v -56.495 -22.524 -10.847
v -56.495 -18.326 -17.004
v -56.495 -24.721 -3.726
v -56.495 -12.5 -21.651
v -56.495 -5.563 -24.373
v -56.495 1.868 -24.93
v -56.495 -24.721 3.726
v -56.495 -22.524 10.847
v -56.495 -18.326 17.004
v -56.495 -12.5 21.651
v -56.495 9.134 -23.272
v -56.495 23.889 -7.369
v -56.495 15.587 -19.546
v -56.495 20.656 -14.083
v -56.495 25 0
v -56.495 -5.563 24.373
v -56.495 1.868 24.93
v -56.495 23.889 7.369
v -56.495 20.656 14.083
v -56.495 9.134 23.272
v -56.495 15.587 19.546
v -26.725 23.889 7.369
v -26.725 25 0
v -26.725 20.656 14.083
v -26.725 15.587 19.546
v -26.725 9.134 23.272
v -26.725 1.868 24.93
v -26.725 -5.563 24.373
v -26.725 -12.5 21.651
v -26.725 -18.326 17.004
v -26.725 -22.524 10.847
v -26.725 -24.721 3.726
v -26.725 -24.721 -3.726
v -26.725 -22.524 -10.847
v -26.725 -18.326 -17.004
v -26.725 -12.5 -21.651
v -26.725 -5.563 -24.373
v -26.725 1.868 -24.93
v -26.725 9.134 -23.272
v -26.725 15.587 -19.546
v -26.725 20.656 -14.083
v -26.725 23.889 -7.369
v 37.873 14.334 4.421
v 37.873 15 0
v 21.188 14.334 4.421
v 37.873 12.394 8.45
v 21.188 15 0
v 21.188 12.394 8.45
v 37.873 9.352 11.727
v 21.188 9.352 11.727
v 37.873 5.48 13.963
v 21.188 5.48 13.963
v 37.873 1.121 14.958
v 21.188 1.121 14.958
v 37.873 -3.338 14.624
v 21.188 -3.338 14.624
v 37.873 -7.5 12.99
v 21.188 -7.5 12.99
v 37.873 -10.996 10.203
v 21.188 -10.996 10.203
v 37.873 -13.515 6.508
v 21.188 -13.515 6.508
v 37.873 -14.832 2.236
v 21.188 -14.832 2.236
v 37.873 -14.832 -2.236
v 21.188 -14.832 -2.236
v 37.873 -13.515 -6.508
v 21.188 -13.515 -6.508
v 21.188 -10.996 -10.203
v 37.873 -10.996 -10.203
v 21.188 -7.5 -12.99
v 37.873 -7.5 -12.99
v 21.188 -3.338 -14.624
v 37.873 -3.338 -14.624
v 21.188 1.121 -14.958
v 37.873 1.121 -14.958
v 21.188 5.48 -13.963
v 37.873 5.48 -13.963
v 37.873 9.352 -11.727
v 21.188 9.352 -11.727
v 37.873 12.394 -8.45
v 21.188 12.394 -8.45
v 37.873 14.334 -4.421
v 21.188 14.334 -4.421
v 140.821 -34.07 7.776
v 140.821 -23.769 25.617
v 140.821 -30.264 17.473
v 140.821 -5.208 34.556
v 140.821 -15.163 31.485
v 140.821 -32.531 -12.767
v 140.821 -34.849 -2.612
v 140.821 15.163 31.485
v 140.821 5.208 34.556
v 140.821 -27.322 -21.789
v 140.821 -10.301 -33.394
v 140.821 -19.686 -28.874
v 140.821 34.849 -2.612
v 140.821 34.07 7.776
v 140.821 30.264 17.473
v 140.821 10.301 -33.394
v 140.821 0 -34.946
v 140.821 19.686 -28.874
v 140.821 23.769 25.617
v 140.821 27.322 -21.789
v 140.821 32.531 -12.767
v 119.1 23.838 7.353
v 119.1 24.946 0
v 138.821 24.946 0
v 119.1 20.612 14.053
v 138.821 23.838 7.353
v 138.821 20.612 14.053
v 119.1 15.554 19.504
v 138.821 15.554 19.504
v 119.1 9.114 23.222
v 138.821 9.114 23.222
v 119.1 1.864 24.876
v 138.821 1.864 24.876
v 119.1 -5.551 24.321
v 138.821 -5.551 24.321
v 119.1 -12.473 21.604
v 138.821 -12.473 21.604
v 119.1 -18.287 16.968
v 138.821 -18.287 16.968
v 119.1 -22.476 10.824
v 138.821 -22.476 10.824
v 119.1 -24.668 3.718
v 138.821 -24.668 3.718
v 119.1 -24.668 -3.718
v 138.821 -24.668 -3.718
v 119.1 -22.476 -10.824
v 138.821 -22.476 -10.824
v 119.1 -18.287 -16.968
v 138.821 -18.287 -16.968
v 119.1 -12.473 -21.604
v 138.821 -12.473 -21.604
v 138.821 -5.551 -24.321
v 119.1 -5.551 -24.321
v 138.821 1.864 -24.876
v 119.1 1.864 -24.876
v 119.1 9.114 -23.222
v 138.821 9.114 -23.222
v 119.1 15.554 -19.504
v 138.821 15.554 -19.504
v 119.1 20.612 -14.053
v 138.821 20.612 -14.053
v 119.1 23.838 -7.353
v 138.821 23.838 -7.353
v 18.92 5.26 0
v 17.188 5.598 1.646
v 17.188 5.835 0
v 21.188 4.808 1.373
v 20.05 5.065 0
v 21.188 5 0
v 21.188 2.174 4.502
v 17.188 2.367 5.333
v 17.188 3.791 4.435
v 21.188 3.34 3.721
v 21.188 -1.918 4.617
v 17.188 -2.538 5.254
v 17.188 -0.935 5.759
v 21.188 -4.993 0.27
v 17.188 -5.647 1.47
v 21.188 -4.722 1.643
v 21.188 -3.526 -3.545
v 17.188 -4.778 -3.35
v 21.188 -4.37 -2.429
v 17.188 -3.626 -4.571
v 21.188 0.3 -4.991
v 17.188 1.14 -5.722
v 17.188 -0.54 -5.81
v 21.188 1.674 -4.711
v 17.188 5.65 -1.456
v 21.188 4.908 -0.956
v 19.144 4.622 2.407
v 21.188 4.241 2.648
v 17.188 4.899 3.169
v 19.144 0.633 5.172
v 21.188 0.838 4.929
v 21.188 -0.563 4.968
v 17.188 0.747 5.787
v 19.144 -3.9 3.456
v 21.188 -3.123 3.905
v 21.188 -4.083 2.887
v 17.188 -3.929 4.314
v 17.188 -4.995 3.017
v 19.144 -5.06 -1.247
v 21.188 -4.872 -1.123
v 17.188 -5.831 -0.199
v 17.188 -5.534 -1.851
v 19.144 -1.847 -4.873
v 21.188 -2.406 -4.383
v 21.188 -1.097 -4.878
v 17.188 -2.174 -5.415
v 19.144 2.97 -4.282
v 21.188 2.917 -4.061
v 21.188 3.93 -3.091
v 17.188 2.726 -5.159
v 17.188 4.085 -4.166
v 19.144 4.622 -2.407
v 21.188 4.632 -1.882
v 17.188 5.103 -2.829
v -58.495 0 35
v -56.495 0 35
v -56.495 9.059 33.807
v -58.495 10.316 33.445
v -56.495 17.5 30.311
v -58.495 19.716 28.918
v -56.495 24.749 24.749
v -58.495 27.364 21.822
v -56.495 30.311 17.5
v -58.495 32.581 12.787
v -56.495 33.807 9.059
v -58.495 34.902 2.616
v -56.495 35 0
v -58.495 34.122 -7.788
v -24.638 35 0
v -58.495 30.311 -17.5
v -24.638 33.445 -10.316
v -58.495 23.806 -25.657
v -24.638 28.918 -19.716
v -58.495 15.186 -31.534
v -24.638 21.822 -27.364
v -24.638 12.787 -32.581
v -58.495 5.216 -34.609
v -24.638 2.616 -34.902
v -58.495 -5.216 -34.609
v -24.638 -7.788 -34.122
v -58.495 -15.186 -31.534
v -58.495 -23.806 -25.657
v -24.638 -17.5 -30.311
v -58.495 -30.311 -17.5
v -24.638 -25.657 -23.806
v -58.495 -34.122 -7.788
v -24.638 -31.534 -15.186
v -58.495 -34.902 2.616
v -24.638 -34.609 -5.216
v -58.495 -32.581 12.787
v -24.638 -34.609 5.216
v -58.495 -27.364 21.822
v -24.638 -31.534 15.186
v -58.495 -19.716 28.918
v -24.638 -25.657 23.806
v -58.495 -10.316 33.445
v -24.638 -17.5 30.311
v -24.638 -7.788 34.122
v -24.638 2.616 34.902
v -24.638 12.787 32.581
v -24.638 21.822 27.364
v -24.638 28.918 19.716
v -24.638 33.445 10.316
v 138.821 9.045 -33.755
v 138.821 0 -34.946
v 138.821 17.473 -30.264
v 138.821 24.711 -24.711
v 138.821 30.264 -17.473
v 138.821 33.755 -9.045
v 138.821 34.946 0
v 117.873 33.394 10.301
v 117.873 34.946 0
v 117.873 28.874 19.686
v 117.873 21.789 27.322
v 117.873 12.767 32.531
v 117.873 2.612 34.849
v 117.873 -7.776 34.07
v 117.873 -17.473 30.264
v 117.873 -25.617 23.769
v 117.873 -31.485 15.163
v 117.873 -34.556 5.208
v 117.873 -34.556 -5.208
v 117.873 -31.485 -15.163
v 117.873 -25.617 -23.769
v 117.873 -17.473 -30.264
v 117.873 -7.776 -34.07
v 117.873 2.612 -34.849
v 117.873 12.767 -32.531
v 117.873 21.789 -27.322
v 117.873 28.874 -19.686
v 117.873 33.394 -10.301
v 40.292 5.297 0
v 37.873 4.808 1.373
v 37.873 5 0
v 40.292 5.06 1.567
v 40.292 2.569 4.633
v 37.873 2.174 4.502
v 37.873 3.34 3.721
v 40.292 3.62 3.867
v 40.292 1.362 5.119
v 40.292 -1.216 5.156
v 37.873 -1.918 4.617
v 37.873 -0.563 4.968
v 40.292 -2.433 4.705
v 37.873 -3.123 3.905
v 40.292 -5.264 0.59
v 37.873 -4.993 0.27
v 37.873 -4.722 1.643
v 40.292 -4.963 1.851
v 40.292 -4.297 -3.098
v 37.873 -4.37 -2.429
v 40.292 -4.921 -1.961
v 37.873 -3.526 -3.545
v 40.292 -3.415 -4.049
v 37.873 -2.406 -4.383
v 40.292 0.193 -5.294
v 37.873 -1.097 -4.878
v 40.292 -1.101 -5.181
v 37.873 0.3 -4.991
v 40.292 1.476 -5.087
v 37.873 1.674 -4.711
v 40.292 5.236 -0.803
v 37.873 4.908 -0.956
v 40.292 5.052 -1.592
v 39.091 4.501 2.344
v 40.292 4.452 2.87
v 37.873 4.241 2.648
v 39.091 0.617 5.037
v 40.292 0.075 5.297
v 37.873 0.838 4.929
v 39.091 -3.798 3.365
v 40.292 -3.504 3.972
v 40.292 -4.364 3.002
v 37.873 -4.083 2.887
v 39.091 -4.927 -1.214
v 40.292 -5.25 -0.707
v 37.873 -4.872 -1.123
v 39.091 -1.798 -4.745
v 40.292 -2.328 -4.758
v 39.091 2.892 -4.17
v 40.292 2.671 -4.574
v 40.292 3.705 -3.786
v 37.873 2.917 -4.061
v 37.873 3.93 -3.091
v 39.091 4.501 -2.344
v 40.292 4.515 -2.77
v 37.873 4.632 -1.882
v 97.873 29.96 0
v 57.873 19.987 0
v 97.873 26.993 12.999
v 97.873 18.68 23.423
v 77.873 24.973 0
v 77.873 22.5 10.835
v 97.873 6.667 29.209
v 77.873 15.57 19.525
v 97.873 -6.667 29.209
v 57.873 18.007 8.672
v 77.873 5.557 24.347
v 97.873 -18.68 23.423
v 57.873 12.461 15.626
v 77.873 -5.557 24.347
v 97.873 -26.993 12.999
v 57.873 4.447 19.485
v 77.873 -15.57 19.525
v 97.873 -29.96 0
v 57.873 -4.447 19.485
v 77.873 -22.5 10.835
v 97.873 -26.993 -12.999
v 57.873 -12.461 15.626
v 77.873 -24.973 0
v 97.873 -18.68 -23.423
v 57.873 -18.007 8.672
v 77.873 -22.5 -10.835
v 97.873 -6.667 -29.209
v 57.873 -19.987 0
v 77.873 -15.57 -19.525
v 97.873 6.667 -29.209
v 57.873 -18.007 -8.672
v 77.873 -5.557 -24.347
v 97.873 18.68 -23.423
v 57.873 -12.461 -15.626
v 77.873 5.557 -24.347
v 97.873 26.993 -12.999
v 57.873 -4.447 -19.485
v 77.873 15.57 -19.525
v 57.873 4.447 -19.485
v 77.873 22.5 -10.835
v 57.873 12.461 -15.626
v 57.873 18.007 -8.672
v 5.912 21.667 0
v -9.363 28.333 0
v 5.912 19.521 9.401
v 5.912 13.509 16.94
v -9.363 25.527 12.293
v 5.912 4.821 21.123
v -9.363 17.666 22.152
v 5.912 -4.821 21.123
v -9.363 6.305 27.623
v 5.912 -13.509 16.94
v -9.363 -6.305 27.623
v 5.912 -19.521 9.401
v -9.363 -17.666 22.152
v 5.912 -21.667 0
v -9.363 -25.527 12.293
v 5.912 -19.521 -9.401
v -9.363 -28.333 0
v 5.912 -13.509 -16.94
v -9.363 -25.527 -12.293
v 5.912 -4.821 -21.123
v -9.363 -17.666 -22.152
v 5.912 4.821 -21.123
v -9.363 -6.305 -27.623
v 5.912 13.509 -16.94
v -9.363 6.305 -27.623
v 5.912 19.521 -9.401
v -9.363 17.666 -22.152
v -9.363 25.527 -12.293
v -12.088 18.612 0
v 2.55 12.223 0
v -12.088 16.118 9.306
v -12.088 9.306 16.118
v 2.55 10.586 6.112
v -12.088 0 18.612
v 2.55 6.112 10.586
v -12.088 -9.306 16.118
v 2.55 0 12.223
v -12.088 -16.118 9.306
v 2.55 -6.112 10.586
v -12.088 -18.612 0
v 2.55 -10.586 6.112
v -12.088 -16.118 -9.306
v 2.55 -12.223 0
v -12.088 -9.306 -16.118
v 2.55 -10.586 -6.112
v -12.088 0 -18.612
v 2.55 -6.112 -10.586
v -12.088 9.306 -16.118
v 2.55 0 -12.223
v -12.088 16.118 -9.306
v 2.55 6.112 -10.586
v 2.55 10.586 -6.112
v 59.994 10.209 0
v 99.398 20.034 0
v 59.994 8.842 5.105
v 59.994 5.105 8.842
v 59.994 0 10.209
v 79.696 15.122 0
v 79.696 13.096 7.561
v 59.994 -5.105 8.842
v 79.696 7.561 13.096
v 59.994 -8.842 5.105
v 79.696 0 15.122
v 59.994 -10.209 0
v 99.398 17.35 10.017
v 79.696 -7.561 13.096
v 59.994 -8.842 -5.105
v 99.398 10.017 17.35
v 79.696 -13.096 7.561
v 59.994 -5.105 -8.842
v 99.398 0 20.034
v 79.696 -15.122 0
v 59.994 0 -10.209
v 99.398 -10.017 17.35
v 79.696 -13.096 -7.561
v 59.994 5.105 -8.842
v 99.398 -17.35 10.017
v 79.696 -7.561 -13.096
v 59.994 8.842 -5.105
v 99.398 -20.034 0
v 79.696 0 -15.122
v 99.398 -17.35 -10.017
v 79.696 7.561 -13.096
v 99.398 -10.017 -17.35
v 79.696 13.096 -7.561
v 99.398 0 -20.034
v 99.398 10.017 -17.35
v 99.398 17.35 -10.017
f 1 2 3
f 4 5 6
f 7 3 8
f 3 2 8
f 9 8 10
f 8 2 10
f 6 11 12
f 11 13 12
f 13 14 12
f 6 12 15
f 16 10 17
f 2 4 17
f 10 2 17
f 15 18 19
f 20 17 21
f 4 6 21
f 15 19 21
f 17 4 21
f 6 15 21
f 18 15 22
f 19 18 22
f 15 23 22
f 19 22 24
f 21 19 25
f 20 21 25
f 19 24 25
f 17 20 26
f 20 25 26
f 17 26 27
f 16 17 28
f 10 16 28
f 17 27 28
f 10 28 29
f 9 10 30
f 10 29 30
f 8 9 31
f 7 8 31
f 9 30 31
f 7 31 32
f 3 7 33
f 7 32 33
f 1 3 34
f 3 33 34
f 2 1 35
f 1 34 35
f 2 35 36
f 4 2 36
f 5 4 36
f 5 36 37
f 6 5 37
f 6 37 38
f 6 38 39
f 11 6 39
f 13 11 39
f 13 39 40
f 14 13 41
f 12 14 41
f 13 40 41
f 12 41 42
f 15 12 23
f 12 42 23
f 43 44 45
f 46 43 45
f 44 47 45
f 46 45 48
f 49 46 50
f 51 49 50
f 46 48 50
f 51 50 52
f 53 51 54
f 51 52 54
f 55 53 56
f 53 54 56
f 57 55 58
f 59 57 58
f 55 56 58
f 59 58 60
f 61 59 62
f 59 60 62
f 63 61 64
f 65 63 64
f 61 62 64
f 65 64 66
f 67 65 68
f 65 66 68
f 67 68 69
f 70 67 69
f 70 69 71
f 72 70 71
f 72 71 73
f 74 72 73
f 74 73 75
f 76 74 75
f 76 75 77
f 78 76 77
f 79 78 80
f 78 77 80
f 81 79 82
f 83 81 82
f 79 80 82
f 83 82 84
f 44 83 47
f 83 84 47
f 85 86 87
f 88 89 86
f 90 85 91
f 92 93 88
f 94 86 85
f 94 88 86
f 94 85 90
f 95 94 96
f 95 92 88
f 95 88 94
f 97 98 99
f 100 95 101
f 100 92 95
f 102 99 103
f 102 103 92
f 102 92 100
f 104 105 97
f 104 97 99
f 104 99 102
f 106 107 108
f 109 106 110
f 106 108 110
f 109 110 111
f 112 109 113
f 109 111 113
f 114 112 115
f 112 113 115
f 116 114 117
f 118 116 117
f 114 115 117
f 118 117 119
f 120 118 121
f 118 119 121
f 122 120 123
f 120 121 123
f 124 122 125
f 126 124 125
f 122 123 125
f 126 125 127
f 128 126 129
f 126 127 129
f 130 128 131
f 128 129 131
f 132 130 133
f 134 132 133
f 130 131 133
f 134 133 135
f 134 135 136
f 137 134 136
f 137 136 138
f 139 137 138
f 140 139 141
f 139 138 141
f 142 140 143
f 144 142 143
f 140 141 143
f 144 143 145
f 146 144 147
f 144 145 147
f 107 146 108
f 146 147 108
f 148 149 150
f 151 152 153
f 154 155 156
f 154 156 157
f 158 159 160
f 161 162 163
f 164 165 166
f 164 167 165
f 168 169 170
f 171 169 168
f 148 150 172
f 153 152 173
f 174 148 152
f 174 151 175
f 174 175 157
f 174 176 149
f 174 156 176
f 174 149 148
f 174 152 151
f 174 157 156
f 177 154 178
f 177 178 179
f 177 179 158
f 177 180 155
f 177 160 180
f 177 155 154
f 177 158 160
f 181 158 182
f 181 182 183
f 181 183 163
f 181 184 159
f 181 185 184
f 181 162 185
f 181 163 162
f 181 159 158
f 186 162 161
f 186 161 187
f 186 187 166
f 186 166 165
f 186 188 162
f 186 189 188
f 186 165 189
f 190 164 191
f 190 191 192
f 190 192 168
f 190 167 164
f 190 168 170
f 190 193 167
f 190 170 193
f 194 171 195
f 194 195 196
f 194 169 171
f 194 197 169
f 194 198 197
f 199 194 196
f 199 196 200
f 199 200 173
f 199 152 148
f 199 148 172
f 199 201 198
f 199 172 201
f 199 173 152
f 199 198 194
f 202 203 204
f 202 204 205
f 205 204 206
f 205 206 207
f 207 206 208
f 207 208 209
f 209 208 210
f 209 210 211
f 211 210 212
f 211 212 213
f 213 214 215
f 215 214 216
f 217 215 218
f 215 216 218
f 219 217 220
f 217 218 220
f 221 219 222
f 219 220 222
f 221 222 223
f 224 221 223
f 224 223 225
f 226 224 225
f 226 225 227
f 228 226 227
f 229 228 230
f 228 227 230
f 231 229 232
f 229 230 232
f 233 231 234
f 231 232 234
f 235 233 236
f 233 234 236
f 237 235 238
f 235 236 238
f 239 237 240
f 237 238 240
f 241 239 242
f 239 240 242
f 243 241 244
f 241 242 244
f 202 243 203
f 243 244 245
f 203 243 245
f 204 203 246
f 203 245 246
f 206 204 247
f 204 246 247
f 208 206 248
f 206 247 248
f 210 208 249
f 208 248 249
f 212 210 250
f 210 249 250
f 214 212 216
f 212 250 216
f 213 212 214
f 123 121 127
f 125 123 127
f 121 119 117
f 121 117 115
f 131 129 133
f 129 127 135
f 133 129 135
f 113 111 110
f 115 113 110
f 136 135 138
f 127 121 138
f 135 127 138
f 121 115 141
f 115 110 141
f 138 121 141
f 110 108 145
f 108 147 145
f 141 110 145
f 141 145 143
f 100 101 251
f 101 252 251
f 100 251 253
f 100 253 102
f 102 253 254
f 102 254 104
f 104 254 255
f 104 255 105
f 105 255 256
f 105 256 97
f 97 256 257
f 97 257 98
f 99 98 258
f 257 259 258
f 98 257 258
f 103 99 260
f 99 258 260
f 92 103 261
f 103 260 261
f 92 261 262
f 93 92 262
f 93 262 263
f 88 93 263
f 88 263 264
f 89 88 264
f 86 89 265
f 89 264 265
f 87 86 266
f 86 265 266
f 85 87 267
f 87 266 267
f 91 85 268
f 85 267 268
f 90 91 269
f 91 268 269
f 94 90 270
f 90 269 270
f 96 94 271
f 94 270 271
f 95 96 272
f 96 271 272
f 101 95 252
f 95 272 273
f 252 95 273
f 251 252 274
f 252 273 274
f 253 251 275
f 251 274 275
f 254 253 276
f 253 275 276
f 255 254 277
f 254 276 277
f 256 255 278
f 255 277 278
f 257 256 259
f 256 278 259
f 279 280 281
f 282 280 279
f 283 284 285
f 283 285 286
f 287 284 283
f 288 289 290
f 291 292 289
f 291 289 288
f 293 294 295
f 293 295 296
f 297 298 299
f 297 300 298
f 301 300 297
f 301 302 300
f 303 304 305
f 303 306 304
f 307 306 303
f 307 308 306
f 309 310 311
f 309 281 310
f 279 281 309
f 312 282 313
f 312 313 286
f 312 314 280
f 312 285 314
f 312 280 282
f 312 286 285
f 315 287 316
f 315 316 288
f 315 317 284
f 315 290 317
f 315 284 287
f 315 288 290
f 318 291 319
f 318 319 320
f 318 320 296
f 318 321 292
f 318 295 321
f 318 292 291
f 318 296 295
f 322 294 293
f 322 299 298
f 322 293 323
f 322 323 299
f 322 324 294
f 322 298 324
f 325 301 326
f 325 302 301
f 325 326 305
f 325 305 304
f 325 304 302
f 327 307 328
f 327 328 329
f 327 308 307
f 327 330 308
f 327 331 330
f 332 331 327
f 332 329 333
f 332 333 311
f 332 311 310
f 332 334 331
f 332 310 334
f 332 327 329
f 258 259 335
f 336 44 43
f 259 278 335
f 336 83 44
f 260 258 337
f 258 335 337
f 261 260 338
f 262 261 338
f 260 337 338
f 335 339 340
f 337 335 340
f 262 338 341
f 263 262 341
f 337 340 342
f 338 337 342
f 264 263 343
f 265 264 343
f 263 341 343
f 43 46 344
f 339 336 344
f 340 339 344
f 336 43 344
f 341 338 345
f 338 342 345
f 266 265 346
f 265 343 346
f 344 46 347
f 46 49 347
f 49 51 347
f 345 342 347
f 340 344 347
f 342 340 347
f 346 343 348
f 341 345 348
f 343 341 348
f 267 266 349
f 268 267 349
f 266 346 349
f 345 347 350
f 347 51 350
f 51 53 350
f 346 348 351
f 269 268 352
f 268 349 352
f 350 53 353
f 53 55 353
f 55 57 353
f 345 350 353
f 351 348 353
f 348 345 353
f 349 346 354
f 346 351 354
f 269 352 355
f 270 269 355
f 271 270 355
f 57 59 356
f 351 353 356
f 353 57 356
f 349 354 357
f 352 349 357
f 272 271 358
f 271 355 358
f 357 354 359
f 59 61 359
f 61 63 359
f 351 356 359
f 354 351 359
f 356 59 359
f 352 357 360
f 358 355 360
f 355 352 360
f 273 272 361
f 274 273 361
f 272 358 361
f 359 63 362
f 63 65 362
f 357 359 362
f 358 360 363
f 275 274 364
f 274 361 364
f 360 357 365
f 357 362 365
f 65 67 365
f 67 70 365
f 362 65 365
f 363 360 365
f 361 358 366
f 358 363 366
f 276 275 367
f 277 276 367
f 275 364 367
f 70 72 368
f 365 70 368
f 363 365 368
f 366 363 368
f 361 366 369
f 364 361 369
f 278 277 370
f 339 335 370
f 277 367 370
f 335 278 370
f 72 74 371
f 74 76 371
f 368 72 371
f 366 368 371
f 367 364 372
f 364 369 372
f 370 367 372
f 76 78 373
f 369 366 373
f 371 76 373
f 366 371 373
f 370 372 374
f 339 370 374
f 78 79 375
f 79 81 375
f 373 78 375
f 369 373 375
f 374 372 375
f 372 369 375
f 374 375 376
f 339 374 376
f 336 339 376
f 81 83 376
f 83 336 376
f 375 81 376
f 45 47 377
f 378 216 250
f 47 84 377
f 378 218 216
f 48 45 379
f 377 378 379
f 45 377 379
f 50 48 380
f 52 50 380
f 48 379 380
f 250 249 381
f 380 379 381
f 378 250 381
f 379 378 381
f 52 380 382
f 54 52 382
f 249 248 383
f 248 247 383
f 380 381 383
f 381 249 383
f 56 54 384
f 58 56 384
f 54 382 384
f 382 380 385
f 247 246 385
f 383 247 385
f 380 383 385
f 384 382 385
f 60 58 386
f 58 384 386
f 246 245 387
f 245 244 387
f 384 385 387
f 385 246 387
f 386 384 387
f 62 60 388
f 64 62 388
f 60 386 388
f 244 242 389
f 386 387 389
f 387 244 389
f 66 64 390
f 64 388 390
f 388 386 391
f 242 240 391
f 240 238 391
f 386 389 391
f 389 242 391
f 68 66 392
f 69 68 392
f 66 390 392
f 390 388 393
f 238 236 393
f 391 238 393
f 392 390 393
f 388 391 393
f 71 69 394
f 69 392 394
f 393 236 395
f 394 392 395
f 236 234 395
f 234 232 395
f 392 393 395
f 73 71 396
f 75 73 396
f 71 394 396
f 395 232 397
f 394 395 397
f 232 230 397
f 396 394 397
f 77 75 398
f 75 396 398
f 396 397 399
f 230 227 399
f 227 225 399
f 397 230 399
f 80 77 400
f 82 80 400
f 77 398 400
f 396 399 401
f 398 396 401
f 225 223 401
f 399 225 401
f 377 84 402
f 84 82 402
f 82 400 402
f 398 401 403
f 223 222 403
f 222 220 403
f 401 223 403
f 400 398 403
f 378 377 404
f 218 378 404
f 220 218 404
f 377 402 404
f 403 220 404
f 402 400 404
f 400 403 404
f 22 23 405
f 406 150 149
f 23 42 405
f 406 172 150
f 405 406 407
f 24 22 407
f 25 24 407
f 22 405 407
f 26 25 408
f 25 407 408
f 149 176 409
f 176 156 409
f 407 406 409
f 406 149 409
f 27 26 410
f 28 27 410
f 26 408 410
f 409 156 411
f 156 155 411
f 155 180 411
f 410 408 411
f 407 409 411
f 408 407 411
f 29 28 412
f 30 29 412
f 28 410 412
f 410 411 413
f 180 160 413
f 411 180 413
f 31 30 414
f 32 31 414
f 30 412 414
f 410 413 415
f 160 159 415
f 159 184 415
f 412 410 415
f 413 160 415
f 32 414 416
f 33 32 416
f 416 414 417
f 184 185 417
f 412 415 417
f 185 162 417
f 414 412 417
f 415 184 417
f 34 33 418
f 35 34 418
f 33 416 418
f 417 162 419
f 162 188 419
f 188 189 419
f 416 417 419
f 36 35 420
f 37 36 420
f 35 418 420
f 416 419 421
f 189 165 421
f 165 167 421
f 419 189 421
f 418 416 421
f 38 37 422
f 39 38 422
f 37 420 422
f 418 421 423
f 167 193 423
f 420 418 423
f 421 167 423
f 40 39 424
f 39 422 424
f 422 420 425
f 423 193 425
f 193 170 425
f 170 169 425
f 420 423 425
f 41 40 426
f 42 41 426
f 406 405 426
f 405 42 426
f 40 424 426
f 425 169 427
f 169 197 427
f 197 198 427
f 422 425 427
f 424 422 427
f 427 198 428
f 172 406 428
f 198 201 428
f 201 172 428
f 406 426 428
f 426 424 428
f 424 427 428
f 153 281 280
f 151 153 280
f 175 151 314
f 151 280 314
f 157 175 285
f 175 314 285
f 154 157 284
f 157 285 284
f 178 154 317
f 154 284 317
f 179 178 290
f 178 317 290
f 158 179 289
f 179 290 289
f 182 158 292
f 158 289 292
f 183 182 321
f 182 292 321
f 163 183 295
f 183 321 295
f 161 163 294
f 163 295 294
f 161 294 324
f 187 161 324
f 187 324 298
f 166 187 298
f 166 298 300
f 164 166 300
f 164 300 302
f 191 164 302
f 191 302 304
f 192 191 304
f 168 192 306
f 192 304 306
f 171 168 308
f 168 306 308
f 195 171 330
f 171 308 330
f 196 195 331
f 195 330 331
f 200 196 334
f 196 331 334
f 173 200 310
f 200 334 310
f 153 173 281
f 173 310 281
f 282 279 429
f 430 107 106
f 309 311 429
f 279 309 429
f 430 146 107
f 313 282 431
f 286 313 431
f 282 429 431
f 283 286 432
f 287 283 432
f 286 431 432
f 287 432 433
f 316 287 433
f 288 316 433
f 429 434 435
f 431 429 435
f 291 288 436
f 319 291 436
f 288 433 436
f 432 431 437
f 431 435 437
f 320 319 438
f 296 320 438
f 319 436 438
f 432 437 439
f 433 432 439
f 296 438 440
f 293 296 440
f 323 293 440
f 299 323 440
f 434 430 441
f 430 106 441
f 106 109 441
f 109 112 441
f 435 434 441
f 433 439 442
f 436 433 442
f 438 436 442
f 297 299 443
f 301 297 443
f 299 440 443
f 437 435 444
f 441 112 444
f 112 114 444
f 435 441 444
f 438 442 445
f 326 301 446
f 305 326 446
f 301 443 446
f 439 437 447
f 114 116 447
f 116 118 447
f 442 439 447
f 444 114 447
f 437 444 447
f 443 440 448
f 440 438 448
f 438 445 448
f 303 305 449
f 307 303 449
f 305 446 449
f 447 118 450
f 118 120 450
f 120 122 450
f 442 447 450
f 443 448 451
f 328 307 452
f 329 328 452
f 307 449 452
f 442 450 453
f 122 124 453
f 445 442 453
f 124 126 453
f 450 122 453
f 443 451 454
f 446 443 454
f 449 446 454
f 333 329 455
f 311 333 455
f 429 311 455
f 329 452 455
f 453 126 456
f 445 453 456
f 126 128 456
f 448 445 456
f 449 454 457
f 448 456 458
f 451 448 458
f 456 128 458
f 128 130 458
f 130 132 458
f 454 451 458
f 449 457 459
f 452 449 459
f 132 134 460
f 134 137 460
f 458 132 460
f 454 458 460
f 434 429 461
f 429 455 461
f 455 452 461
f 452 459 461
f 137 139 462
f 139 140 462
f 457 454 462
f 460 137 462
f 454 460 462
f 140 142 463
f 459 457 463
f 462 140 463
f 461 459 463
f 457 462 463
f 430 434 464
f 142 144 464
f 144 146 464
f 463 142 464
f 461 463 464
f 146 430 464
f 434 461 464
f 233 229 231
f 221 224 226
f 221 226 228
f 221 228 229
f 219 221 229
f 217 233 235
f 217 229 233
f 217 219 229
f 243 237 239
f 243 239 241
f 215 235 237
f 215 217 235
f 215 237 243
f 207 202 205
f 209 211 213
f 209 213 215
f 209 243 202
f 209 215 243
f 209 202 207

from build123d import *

# Parameters (mm, degrees)
FILLET1_R           = 10
SKETCH2_R           = 35
BOSS_EXTRUDE1_DEPTH = 2
SKETCH3_R           = 34.94624
BOSS_EXTRUDE2_DEPTH = 2


with BuildPart() as part:
    # Sketch1 → Revolve-Thin1 (revolve)
    with BuildSketch(Plane.XY):
        Polygon((-56.494883, 25), (-26.725314, 25), (19.100443, 5), (39.100443, 5), (119.100443, 24.94624), (138.82137, 24.94624), (138.82137, 34.94624), (117.872597, 34.94624), (37.872597, 15), (21.187564, 15), (-24.638193, 35), (-56.494883, 35), align=None)
    revolve(axis=Axis((-43.02316, 0, 0), (1, 0, 0)))

    # Fillet1
    fillet1_edges = [part.edges().sort_by_distance(p)[0] for p in [
        (19.100443, -5, 0),
        (39.100443, -5, 0),
    ]]
    fillet(fillet1_edges, radius=FILLET1_R)

    # Sketch2 → Boss-Extrude1 (add)
    with BuildSketch(Plane.ZY.offset(56.494883)):
        Circle(SKETCH2_R)
    extrude(amount=BOSS_EXTRUDE1_DEPTH)

    # Sketch3 → Boss-Extrude2 (add)
    with BuildSketch(Plane(origin=(138.82137, 0, 0), x_dir=(0, 0, -1), z_dir=(1, 0, 0))):
        Circle(SKETCH3_R)
    extrude(amount=BOSS_EXTRUDE2_DEPTH)


solid = part.part
